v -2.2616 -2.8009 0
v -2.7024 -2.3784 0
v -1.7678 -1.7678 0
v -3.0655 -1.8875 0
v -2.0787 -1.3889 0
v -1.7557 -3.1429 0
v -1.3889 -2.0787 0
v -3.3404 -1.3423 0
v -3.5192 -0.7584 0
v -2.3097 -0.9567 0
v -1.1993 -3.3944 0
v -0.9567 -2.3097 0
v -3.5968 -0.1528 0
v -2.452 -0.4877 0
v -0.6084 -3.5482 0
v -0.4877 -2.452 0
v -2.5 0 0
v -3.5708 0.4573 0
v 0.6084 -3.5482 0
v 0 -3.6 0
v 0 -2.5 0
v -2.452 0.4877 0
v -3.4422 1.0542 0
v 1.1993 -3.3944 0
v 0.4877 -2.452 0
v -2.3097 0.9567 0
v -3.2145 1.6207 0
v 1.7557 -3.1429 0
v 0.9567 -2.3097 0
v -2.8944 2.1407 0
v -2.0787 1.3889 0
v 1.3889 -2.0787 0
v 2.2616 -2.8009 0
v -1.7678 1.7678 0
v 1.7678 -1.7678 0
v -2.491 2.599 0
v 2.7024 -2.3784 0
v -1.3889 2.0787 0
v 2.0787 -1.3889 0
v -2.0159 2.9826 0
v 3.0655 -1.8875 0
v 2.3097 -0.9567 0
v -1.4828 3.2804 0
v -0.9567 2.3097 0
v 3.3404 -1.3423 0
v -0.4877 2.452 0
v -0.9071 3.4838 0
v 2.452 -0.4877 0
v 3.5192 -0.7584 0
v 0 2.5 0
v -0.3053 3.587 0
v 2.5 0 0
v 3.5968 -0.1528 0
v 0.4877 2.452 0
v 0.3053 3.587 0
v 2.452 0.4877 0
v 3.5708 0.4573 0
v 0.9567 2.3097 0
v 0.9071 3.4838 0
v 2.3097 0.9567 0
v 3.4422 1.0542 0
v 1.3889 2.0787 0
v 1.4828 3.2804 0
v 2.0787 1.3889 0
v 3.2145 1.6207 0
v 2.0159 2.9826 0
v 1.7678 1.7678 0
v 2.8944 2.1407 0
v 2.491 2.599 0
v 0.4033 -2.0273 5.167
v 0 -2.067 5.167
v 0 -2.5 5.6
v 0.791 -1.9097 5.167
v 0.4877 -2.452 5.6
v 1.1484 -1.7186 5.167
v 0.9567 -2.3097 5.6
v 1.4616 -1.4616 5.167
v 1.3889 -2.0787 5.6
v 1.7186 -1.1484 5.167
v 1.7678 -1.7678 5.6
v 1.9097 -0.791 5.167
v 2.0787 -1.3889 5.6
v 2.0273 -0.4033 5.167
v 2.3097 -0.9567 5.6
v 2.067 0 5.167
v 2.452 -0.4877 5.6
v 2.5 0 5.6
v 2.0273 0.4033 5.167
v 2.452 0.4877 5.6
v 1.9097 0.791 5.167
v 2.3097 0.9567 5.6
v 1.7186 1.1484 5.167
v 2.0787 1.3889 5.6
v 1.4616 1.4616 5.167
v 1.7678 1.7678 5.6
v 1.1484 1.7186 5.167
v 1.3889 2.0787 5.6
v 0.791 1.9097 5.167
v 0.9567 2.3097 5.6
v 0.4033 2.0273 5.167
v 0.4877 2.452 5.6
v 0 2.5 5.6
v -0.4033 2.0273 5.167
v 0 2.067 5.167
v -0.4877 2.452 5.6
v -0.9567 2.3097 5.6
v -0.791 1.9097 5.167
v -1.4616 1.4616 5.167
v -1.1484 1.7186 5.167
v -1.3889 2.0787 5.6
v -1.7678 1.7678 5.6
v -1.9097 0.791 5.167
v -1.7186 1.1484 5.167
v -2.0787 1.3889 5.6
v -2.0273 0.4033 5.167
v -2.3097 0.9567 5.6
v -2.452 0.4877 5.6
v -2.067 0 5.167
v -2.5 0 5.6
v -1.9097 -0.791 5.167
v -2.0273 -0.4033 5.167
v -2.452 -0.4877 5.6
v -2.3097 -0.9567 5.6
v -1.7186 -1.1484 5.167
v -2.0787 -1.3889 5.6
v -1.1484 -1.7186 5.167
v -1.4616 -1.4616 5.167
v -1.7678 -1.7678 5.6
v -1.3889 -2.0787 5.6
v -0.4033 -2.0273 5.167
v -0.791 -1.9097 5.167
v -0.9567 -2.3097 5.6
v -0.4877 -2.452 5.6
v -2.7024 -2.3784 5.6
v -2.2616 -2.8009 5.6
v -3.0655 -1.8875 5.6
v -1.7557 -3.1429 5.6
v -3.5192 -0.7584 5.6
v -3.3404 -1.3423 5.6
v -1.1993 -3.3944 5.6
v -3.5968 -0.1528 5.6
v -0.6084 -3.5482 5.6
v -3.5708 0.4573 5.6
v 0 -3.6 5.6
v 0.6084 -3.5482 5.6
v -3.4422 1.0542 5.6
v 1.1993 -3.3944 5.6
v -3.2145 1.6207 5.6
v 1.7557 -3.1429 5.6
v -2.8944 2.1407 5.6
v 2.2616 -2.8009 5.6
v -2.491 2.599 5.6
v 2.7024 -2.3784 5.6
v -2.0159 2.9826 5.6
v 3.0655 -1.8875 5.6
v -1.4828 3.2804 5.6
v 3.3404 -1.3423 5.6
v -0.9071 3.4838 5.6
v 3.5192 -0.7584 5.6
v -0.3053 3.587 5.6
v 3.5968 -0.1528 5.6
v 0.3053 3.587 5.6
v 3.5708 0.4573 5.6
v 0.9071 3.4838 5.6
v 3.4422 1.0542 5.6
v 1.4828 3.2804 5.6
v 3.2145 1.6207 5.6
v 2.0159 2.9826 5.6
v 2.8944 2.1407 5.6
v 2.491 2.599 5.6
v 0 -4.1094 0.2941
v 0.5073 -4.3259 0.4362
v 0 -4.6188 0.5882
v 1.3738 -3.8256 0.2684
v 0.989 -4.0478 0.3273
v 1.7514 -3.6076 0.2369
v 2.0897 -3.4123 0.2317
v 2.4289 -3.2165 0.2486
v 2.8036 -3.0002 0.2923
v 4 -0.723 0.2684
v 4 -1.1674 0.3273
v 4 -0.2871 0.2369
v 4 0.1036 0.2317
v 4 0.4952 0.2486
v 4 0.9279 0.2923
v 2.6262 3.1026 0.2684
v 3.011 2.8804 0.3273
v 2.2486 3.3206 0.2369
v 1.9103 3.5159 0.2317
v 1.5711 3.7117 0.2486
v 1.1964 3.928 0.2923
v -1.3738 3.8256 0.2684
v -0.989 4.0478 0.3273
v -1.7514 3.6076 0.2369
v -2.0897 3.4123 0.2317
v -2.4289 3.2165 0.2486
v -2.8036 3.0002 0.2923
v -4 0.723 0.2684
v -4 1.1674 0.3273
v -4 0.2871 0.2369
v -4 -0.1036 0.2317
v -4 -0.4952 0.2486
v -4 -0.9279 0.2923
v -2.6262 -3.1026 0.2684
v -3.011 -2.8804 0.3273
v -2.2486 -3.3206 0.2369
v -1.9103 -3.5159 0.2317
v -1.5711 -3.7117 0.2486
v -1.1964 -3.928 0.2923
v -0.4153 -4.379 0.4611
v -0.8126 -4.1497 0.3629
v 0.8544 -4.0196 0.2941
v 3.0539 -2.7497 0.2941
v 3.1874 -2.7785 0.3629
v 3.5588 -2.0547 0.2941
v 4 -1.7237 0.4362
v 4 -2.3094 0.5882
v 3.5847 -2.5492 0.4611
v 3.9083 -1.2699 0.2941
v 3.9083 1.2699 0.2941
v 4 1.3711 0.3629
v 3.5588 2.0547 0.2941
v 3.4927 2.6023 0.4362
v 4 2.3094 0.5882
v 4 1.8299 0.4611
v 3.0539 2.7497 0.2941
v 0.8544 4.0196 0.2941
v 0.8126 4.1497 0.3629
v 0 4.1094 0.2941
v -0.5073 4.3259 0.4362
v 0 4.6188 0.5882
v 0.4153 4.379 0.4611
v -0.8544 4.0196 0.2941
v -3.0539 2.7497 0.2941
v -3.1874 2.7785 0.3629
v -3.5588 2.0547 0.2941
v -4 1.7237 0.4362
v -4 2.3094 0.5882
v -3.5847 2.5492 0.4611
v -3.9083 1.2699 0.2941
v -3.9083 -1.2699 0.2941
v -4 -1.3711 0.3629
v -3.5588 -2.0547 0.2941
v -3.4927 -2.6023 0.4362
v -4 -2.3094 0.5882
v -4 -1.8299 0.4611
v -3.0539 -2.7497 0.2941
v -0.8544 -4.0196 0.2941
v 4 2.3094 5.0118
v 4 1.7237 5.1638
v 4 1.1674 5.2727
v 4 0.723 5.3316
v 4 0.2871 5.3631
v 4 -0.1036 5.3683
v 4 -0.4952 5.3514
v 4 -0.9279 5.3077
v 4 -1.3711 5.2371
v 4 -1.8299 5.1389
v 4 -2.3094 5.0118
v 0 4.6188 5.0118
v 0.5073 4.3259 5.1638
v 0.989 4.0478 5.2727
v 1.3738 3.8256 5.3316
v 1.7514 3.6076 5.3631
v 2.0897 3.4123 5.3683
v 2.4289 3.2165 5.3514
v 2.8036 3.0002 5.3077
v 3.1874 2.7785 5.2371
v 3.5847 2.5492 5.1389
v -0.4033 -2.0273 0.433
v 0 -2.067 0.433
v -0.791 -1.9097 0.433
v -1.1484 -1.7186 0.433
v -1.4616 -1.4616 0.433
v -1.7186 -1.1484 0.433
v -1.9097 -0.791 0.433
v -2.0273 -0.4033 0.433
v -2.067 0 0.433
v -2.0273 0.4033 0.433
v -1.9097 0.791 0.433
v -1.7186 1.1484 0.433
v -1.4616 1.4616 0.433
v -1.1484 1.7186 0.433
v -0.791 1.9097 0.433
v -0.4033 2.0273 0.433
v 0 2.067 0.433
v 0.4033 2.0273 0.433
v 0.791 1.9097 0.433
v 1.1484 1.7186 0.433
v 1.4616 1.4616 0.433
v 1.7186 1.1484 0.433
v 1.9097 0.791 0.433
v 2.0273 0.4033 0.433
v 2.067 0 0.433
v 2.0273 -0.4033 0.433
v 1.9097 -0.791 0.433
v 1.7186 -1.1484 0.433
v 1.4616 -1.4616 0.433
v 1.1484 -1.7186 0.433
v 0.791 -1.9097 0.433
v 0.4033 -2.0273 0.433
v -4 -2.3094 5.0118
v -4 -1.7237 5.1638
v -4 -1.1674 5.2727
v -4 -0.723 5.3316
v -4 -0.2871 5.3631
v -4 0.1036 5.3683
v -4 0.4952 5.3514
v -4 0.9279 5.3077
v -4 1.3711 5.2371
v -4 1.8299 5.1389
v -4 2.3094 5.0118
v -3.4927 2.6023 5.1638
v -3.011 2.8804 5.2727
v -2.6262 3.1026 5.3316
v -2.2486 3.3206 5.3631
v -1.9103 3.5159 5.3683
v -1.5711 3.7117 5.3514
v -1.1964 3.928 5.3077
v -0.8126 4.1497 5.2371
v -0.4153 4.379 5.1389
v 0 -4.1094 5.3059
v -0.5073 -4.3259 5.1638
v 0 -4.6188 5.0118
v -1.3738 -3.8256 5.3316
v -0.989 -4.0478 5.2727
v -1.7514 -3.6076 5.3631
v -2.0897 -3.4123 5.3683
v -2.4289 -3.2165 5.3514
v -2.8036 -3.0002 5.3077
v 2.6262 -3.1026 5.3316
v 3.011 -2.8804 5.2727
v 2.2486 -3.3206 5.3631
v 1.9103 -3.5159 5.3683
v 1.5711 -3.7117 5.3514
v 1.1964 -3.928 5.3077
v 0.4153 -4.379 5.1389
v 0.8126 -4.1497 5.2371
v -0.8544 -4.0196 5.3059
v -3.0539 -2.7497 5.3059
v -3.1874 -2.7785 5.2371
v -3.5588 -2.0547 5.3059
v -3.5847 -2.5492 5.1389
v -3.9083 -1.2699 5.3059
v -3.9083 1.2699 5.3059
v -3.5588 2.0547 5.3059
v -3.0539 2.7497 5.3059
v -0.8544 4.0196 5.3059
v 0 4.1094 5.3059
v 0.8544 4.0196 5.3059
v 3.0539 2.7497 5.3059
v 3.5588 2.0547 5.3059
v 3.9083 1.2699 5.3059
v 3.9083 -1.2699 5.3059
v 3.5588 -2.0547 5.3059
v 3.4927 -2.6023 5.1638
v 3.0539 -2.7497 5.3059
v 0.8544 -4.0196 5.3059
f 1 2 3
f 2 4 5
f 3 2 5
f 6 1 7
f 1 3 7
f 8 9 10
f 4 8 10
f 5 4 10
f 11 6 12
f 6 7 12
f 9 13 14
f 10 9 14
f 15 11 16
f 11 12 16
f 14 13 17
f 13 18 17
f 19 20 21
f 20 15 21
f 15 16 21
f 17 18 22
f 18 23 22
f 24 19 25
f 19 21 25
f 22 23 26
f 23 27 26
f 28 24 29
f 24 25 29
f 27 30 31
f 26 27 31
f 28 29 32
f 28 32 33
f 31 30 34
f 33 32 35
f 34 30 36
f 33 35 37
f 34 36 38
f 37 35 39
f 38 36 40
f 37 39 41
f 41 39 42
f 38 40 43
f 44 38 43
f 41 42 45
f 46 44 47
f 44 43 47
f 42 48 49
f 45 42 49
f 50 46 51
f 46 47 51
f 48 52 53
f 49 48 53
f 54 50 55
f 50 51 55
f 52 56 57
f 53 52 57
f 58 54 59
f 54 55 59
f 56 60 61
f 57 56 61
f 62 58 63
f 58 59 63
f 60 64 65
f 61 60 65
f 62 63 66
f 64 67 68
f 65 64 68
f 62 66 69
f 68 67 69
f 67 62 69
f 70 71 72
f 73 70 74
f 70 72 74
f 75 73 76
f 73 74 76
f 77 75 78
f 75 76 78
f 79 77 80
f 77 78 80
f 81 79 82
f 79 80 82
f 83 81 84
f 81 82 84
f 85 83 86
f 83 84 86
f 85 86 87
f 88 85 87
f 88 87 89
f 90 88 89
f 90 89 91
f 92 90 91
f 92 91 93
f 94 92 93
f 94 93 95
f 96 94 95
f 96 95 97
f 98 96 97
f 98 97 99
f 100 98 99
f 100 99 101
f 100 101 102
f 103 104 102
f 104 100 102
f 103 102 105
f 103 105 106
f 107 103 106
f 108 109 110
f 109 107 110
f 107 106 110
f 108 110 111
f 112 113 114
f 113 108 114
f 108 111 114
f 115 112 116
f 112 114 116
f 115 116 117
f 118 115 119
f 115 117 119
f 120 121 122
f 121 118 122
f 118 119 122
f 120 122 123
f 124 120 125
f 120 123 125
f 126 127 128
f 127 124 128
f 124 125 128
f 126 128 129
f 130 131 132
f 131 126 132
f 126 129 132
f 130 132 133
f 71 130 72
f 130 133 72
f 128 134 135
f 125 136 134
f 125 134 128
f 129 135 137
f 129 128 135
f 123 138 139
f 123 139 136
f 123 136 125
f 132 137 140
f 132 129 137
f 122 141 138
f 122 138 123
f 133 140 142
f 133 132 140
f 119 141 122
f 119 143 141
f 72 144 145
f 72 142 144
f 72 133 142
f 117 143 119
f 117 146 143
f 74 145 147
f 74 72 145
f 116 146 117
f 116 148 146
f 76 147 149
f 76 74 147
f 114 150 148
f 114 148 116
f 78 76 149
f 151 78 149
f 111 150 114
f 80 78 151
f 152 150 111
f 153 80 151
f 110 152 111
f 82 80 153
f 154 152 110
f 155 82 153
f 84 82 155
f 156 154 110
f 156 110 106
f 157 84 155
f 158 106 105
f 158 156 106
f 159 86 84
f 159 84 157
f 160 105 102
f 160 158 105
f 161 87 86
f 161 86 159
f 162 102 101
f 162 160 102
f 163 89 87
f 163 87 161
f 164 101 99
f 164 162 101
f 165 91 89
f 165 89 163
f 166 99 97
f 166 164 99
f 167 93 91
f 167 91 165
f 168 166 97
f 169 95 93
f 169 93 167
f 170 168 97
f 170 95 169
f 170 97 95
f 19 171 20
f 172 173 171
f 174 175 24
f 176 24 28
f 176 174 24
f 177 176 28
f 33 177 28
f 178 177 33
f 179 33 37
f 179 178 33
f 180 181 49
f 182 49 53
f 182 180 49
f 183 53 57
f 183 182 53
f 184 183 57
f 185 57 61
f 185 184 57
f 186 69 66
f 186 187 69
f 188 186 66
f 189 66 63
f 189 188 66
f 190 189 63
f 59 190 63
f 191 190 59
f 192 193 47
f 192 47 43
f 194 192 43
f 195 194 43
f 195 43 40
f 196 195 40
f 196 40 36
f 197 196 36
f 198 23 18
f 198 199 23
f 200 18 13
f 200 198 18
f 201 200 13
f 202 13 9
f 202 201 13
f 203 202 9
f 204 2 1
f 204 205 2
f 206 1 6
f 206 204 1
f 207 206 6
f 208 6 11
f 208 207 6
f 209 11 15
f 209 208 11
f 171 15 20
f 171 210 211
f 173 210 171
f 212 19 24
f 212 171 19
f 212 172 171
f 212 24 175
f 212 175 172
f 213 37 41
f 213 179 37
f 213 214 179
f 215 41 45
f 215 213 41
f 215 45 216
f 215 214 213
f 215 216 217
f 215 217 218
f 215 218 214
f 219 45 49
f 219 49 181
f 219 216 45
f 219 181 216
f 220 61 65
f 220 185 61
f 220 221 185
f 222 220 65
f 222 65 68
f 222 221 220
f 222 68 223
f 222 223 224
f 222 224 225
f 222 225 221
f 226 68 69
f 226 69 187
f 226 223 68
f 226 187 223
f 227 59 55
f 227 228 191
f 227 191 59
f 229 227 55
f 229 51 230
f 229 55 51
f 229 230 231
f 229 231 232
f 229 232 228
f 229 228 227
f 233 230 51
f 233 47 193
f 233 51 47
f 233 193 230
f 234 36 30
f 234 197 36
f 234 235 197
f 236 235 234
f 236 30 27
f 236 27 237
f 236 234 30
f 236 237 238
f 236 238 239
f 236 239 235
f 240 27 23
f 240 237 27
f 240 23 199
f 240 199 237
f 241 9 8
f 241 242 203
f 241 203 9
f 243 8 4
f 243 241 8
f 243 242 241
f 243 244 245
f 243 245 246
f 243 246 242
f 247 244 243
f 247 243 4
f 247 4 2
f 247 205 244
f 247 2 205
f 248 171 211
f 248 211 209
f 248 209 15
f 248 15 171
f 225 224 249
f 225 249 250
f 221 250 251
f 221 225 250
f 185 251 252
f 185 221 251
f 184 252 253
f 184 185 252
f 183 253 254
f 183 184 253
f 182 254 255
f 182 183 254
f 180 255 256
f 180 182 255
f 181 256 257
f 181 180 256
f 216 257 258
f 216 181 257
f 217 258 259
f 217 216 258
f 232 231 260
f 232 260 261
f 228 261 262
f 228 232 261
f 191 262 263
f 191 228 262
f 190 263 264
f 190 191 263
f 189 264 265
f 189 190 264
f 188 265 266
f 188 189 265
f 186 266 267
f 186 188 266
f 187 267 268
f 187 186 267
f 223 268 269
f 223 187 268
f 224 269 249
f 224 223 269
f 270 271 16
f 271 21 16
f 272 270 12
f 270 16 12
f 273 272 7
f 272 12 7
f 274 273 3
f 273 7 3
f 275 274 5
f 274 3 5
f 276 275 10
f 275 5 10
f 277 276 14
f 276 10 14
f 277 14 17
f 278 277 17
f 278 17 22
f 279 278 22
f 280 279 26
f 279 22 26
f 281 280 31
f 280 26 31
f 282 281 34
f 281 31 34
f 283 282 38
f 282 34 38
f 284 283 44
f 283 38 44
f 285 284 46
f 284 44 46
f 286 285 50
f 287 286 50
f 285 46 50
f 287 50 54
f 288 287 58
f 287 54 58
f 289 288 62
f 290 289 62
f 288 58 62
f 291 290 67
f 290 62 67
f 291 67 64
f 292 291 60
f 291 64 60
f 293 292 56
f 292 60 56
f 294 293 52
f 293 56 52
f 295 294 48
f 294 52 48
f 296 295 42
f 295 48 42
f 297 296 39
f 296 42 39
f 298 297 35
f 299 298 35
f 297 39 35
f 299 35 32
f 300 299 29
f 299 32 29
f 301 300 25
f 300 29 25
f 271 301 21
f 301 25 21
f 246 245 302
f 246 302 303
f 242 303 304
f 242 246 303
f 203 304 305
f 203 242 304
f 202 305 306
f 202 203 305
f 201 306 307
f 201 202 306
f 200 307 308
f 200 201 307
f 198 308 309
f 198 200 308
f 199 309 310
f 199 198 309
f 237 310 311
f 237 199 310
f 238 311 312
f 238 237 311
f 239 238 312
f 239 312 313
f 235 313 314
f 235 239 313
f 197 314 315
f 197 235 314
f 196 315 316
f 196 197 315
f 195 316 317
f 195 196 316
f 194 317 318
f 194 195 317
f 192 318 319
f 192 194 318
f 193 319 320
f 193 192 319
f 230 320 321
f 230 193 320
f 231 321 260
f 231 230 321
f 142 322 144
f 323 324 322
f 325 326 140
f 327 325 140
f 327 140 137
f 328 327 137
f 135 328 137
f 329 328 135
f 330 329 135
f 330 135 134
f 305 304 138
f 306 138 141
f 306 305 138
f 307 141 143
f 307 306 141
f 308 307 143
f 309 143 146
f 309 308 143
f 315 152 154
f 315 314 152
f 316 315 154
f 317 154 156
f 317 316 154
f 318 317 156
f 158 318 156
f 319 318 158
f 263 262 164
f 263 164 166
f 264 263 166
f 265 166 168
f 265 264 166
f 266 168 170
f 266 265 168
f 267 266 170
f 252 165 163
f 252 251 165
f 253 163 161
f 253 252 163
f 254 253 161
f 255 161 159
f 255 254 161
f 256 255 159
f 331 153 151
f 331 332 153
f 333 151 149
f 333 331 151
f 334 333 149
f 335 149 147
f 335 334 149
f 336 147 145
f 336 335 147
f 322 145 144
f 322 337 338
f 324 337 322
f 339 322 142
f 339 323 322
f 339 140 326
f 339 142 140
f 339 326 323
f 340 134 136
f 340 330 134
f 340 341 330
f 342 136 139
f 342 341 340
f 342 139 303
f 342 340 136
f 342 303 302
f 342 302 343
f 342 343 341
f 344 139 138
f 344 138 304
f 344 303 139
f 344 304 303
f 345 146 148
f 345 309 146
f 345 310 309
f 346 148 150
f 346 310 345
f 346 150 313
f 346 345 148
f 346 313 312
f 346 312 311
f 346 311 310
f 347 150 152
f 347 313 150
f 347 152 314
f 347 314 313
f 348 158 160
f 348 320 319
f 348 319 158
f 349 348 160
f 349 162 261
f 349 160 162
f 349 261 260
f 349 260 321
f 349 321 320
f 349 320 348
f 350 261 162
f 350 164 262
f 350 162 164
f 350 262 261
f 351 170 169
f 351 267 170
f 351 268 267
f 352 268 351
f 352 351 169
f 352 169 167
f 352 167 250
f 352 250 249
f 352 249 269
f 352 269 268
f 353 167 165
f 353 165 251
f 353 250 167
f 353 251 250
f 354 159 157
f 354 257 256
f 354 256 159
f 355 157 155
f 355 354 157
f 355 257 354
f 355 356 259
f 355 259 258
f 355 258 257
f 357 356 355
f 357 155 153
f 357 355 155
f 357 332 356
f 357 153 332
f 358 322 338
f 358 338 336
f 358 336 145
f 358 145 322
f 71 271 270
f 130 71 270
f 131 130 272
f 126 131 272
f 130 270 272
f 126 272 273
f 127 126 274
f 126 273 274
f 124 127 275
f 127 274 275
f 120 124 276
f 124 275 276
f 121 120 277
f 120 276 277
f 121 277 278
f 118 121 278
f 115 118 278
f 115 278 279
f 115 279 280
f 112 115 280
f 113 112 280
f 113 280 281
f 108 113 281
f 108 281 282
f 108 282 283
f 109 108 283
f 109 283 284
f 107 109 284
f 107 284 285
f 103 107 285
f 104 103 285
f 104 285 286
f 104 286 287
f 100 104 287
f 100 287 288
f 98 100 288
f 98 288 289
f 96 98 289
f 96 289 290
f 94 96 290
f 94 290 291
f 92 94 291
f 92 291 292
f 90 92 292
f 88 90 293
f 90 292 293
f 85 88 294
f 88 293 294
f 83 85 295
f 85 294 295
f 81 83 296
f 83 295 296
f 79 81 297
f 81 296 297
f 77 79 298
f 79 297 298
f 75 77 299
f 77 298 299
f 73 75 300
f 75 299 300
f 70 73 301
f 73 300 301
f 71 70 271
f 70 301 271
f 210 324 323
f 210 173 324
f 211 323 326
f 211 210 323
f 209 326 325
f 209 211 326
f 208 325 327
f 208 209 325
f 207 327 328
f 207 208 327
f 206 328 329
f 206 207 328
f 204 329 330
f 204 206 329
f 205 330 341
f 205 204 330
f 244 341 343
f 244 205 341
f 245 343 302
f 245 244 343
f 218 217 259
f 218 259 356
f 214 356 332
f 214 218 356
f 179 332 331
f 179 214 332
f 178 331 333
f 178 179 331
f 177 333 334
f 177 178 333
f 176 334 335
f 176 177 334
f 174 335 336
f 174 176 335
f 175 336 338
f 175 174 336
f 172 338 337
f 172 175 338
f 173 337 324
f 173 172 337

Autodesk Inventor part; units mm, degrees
ref_plane "YZ Plane" through (0, 0, 0) normal (1, 0, 0) x (0, 1, 0)
sketch "Sketch1" plane through (0, 0, 0) normal (0, 0, 1) x (1, 0, 0)
  line L0 (-5.6, 0) -> (5.6, 0) construction
  line L1 (0, -6.4663) -> (0, 6.4663) construction
  line L2 (0, 4.6188) -> (4, 2.3094)
  line L3 (4, 2.3094) -> (4, -2.3094)
  line L4 (4, -2.3094) -> (0, -4.6188)
  line L5 (0, -4.6188) -> (-4, -2.3094)
  line L6 (-4, -2.3094) -> (-4, 2.3094)
  line L7 (-4, 2.3094) -> (0, 4.6188)
  point P0 (0, 0)
  point P1 (0, 0)
  dimension "d67" = 8
extrude "Выдавливание1" add sketch "Sketch1" along normal blind 5.6
ref_plane "Work Plane1" through (0, 0, 6.16) normal (0, 0, 1) x (1, 0, 0)
ref_plane "Work Plane2" through (0, 0, 2.8) normal (0, 0, 1) x (1, 0, 0)
sketch "Sketch2" plane through (0, 0, 5.6) normal (0, 0, 1) x (1, 0, 0)
  point P0 (0, 0)
hole "Отверстие1" at (0, 0, 5.6) direction (0, 0, -1) diameter 4.134 end through all thread size "M5x0.8" class "6H" standard "ISO Metric profile"
sketch "Sketch3" plane through (0, 0, 0) normal (1, 0, 0) x (0, 1, 0)
  line L0 (-2.3094, 5.6) -> (2.3094, 5.6) construction
  line L1 (2.3094, 5.6) -> (4.6188, 5.6) construction
  line L2 (-4.6188, 5.6) -> (-2.3094, 5.6) construction
  line L3 (-2.067, 0) -> (-2.067, 5.6) construction
  line L4 (2.3094, 0) -> (2.3094, 5.6) construction
  line L5 (0, -1.12) -> (0, 6.72) construction
  line L6 (-2.5, 5.6) -> (0, 3.1)
  line L7 (0, 3.1) -> (0, 5.6)
  line L8 (0, 5.6) -> (-2.5, 5.6)
  line L9 (2.5, 5.6) -> (0, 3.1)
  line L10 (0, 5.6) -> (2.5, 5.6)
  point P0 (0, 0)
  dimension "d57" = 45
  dimension "d58" = 5
revolve "Вращение1" cut sketch "Sketch3" angle 360 about axis through (0, 0, -10) along (0, 0, 1) contours L8 L7 L6
sketch "Sketch4" plane through (0, 0, 0) normal (1, 0, 0) x (0, 1, 0)
  line L0 (-3.6, 5.6) -> (-6.1, 4.1566)
  line L1 (-6.1, 4.1566) -> (-6.1, 5.6)
  line L2 (0, -1.12) -> (0, 6.72) construction
  line L3 (-3.6, 5.6) -> (-6.1, 5.6)
  line L4 (3.6, 5.6) -> (6.1, 4.1566)
  line L5 (6.1, 4.1566) -> (6.1, 5.6)
  line L6 (3.6, 5.6) -> (6.1, 5.6)
  point P0 (0, 0)
  dimension "d11" = 30
  dimension "d12" = 7.2
  dimension "d13" = 12.2
  dimension "d60" = 5.6
revolve "Вращение2" cut sketch "Sketch4" angle 360 about axis through (0, 0, -10) along (0, 0, 1) contours L0 L1 L3
mirror "ЗеркОтобр1" about plane through (0, 0, 2.8) normal (0, 0, 1) of "Вращение2"
sketch "Sketch5" plane through (0, 0, 0) normal (1, 0, 0) x (0, 1, 0)
  line L0 (2.067, 0) -> (-2.067, 0) construction
  line L1 (0, -1.12) -> (0, 6.72) construction
  line L2 (-2.5, 0) -> (0, 2.5)
  line L3 (0, 0) -> (-2.5, 0)
  line L4 (-2.067, 0) -> (2.067, 0) construction
  line L5 (2.5, 0) -> (-2.5, 0) construction
  line L6 (2.5, 0) -> (0, 2.5)
  line L7 (0, 0) -> (2.5, 0)
  line L8 (0, 2.5) -> (0, 0)
  point P0 (-1.2295, 3.4)
  point P1 (1.2295, 3.4)
  point P2 (-2.067, 5.6)
  dimension "d54" = 45
  dimension "d55" = 5
revolve "Вращение3" cut sketch "Sketch5" angle 360 about axis through (0, 0, -10) along (0, 0, 1) contours L2 L8 L3
equation "\"d67\" = S_"
equation "\"d1\" = m_"
equation "\"d12\" = dw"
equation "\"d13\" = dw + da"
equation "\"d60\" = m_"
equation "\"d55\" = da"
equation "\"d58\" = da"
equation "\"S_\" = 8"
equation "\"e\" = 8.6"
equation "\"da\" = 5"
equation "\"dw\" = 7.2"
equation "\"m_\" = 5.6"
equation "\"D\" = 5"
equation "\"d15\" = 0.1 * m_"
properties part number "Гайка M5 ГОСТ 15526-70" material "Сталь, мягкая"
